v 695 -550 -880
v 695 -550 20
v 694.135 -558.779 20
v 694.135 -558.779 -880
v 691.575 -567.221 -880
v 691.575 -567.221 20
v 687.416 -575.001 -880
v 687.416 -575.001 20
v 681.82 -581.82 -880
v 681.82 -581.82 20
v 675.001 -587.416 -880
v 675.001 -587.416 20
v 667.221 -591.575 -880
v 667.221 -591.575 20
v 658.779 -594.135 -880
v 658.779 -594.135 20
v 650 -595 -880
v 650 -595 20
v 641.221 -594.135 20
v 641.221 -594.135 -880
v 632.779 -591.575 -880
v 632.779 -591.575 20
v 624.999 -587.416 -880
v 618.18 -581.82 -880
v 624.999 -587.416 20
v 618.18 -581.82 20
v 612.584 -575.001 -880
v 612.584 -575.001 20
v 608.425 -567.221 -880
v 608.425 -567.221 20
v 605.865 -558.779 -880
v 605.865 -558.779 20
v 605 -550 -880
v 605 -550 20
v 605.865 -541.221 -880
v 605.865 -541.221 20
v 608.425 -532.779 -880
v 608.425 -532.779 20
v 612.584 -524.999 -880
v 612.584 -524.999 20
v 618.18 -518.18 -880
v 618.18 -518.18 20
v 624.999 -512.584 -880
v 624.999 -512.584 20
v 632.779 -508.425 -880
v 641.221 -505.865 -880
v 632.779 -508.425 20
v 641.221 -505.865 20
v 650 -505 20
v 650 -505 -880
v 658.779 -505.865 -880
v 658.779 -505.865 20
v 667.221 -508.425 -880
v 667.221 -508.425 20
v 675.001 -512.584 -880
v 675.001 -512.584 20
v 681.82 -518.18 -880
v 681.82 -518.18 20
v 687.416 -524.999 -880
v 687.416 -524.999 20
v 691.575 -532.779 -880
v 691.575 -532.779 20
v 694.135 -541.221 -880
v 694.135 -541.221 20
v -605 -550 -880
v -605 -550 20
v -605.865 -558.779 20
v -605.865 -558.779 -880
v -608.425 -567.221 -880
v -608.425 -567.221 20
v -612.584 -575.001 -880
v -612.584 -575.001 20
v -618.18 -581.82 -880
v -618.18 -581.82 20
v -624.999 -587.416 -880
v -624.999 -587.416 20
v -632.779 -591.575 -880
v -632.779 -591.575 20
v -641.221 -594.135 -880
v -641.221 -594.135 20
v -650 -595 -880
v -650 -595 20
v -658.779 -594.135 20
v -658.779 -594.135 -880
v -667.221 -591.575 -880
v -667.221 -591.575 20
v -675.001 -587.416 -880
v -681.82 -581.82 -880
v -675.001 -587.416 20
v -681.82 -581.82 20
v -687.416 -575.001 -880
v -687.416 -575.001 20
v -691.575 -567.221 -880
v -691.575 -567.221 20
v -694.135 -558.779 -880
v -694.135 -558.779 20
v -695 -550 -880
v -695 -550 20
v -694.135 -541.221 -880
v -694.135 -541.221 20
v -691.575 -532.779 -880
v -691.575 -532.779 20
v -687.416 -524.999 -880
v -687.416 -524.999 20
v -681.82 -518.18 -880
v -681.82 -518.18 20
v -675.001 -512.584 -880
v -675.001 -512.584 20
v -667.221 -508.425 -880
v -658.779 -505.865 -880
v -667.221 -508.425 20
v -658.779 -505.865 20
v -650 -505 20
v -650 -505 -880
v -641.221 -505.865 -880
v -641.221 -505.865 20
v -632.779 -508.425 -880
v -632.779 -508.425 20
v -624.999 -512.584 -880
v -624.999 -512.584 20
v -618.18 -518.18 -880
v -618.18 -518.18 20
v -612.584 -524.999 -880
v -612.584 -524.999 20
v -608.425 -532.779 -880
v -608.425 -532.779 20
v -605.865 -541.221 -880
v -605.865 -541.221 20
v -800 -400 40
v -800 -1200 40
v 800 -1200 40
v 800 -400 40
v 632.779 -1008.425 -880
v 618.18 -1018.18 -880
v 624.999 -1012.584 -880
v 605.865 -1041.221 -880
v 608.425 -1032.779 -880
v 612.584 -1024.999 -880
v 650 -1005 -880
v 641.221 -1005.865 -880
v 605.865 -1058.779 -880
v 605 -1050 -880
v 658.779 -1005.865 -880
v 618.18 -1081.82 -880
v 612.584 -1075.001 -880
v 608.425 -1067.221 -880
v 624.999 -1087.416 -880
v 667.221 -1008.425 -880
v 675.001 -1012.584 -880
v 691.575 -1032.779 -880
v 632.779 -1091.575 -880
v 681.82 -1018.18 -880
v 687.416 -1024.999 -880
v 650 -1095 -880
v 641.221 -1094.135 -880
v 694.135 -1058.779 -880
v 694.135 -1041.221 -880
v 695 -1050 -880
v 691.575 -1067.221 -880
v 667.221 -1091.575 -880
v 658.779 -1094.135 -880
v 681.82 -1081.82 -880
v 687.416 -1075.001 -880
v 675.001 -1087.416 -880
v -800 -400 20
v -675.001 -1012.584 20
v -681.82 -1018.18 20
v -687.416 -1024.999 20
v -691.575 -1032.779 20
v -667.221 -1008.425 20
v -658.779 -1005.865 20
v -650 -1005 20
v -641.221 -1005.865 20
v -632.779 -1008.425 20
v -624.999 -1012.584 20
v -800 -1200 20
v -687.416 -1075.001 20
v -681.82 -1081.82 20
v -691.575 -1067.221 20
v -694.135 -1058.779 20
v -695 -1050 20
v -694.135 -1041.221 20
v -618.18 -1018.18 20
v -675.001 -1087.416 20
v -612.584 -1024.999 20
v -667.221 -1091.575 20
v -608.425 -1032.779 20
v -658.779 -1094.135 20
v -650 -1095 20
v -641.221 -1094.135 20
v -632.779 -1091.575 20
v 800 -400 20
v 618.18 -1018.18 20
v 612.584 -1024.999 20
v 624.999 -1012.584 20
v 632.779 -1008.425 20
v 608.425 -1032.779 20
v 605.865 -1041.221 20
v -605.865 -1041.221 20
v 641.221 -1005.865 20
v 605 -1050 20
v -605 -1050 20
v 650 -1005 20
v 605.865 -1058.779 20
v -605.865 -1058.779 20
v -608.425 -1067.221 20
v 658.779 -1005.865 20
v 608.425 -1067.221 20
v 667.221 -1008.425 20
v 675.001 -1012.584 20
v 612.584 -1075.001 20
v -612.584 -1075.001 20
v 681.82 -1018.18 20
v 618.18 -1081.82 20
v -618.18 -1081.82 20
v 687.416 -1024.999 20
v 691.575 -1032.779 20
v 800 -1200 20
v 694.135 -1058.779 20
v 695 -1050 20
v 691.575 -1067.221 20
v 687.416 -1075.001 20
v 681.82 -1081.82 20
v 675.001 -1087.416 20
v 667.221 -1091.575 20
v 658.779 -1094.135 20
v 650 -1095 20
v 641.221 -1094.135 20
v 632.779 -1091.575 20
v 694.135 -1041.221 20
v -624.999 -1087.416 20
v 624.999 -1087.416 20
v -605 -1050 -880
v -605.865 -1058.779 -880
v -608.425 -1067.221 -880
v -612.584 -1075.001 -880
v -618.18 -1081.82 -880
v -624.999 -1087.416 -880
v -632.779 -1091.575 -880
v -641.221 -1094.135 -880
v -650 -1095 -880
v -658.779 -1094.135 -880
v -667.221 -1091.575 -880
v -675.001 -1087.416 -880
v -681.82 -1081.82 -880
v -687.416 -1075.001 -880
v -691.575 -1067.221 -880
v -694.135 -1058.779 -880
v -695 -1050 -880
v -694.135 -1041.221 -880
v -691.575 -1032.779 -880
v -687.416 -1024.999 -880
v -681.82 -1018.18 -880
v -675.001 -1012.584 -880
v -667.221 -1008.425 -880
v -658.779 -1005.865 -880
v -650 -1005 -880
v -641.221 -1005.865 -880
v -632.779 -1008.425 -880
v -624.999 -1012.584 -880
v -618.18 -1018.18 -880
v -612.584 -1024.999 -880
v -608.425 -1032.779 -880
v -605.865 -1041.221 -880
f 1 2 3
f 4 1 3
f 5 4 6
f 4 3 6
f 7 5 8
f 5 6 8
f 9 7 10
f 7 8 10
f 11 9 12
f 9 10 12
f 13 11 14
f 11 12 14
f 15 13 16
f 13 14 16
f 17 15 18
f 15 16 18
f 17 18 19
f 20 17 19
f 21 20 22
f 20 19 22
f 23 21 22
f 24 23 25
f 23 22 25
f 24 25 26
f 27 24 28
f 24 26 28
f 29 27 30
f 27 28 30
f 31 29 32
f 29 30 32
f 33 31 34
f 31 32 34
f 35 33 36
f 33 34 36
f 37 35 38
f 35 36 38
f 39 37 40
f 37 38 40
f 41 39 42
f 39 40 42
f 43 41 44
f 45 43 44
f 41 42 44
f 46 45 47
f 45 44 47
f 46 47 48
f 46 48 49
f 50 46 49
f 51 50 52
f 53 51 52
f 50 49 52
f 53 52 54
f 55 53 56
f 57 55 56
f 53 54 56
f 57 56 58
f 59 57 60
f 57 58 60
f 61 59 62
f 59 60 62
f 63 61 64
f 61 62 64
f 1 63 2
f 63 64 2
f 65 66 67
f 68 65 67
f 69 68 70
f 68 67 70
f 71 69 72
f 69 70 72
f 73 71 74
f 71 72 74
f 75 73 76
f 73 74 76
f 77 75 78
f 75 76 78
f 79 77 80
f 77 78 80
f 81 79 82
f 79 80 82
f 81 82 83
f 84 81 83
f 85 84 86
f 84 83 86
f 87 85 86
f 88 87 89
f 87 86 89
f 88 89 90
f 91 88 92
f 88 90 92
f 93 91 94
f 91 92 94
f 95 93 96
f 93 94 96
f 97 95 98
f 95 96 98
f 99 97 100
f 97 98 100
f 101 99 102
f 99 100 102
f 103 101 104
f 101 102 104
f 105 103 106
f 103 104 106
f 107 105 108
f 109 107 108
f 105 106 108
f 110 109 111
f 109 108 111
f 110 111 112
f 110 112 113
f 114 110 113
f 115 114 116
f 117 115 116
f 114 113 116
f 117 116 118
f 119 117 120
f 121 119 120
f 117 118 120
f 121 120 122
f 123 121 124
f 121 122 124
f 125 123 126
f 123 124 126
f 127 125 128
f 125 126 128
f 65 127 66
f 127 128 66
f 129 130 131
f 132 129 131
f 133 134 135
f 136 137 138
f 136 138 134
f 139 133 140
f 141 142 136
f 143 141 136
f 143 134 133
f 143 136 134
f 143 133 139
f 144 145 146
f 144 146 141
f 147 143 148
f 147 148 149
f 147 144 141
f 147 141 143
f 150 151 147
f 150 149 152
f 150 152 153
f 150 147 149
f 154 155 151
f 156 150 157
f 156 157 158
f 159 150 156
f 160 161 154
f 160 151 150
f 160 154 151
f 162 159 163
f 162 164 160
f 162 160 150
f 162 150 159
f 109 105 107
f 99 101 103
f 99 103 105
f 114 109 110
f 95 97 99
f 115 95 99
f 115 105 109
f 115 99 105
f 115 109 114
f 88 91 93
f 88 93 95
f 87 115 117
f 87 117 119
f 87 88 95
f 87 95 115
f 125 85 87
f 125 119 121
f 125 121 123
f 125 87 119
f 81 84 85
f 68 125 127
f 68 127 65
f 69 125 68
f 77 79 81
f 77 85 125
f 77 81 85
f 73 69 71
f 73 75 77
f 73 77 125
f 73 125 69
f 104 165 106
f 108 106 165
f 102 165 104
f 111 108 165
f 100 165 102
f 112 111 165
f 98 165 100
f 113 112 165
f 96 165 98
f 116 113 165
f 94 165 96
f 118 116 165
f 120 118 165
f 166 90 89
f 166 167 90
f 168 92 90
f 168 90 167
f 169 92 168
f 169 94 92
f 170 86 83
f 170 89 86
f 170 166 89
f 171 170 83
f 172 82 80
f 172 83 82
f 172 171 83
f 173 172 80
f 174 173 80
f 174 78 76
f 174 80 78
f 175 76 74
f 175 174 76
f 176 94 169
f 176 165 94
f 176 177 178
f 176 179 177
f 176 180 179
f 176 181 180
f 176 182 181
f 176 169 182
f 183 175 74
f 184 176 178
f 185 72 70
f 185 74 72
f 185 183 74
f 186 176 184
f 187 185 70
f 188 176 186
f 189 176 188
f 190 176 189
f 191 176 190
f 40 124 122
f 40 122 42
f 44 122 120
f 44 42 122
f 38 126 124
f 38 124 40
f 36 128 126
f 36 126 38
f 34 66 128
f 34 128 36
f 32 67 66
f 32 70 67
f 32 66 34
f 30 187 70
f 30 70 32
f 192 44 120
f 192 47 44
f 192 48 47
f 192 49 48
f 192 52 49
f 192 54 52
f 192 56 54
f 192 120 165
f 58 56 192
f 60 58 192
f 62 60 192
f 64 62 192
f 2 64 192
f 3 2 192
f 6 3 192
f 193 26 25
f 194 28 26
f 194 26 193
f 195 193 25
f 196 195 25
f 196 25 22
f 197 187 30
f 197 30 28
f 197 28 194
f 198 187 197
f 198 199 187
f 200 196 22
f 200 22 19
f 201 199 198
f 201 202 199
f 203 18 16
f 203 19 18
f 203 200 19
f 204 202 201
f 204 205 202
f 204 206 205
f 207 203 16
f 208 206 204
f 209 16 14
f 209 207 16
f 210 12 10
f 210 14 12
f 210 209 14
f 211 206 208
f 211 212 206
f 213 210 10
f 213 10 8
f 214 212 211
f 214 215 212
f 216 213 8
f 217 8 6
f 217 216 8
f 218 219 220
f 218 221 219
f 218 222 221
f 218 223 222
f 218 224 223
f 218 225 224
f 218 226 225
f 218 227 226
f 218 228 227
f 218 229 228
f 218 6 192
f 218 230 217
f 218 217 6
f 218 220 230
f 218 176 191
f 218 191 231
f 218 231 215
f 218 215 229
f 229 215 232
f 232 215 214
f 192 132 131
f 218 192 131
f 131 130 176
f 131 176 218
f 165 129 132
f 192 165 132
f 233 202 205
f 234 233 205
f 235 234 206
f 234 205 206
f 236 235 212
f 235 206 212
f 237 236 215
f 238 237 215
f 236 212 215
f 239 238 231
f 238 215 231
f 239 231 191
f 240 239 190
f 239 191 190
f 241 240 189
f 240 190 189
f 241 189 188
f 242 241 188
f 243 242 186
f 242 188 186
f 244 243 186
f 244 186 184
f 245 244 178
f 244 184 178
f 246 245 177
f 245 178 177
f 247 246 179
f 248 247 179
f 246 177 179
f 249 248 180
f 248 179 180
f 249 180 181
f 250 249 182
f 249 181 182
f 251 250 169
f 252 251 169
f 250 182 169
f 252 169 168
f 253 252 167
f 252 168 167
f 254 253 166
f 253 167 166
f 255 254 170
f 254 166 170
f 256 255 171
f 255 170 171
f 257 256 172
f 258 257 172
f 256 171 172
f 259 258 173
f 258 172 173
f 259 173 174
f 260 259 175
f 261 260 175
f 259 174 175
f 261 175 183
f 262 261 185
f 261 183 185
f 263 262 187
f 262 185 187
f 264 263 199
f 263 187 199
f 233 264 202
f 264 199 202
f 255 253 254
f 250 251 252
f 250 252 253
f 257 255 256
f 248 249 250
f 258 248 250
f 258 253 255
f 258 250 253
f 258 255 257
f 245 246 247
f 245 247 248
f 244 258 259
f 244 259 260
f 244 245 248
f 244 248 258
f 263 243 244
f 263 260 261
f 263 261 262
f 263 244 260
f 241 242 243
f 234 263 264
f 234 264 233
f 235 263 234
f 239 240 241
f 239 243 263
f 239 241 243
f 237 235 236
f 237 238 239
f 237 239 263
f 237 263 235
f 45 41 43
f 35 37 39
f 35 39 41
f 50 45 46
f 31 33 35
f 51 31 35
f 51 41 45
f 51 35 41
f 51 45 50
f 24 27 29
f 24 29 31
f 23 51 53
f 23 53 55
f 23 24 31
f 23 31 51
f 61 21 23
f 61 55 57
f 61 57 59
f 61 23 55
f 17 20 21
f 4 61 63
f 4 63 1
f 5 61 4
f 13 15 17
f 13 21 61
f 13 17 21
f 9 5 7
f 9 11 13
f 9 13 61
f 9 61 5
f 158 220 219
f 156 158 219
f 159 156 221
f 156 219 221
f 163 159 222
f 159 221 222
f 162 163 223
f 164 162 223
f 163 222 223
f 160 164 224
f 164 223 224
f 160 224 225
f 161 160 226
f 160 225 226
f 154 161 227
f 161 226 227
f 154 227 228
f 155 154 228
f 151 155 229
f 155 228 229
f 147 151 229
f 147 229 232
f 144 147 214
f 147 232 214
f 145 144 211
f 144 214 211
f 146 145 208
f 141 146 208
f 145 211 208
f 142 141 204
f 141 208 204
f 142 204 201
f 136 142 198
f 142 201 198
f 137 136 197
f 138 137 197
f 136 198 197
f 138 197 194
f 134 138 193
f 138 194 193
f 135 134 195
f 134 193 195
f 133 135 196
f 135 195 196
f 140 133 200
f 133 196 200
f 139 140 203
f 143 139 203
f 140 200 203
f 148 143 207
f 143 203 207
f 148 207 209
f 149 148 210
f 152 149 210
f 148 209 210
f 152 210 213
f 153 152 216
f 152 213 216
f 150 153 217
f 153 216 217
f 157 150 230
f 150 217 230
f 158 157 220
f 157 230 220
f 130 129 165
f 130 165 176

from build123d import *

# Parameters (mm, degrees)
F0_W     = 1600
F0_H     = 800
F1_DEPTH = 20
F2_R     = 45
F3_DEPTH = 900
F4_ANGLE = 180


with BuildPart() as f1:
    # F0 (on Top) → F1 (new body)
    with BuildSketch(Plane.XY):
        Rectangle(F0_W, F0_H)
    extrude(amount=F1_DEPTH)

    # F2 (on face) → F3 (join)
    with BuildSketch(Plane.XY.offset(20)):
        with Locations((-650, 250)):
            Circle(F2_R)
        with Locations((650, 250)):
            Circle(F2_R)
        with Locations((-650, -250)):
            Circle(F2_R)
        with Locations((650, -250)):
            Circle(F2_R)
    extrude(amount=F3_DEPTH)


with BuildPart() as f1_1:
    # F4: moved
    add(f1.part.rotate(Axis((0, -400, 20), (1, 0, 0)), F4_ANGLE))


solid = f1_1.part
